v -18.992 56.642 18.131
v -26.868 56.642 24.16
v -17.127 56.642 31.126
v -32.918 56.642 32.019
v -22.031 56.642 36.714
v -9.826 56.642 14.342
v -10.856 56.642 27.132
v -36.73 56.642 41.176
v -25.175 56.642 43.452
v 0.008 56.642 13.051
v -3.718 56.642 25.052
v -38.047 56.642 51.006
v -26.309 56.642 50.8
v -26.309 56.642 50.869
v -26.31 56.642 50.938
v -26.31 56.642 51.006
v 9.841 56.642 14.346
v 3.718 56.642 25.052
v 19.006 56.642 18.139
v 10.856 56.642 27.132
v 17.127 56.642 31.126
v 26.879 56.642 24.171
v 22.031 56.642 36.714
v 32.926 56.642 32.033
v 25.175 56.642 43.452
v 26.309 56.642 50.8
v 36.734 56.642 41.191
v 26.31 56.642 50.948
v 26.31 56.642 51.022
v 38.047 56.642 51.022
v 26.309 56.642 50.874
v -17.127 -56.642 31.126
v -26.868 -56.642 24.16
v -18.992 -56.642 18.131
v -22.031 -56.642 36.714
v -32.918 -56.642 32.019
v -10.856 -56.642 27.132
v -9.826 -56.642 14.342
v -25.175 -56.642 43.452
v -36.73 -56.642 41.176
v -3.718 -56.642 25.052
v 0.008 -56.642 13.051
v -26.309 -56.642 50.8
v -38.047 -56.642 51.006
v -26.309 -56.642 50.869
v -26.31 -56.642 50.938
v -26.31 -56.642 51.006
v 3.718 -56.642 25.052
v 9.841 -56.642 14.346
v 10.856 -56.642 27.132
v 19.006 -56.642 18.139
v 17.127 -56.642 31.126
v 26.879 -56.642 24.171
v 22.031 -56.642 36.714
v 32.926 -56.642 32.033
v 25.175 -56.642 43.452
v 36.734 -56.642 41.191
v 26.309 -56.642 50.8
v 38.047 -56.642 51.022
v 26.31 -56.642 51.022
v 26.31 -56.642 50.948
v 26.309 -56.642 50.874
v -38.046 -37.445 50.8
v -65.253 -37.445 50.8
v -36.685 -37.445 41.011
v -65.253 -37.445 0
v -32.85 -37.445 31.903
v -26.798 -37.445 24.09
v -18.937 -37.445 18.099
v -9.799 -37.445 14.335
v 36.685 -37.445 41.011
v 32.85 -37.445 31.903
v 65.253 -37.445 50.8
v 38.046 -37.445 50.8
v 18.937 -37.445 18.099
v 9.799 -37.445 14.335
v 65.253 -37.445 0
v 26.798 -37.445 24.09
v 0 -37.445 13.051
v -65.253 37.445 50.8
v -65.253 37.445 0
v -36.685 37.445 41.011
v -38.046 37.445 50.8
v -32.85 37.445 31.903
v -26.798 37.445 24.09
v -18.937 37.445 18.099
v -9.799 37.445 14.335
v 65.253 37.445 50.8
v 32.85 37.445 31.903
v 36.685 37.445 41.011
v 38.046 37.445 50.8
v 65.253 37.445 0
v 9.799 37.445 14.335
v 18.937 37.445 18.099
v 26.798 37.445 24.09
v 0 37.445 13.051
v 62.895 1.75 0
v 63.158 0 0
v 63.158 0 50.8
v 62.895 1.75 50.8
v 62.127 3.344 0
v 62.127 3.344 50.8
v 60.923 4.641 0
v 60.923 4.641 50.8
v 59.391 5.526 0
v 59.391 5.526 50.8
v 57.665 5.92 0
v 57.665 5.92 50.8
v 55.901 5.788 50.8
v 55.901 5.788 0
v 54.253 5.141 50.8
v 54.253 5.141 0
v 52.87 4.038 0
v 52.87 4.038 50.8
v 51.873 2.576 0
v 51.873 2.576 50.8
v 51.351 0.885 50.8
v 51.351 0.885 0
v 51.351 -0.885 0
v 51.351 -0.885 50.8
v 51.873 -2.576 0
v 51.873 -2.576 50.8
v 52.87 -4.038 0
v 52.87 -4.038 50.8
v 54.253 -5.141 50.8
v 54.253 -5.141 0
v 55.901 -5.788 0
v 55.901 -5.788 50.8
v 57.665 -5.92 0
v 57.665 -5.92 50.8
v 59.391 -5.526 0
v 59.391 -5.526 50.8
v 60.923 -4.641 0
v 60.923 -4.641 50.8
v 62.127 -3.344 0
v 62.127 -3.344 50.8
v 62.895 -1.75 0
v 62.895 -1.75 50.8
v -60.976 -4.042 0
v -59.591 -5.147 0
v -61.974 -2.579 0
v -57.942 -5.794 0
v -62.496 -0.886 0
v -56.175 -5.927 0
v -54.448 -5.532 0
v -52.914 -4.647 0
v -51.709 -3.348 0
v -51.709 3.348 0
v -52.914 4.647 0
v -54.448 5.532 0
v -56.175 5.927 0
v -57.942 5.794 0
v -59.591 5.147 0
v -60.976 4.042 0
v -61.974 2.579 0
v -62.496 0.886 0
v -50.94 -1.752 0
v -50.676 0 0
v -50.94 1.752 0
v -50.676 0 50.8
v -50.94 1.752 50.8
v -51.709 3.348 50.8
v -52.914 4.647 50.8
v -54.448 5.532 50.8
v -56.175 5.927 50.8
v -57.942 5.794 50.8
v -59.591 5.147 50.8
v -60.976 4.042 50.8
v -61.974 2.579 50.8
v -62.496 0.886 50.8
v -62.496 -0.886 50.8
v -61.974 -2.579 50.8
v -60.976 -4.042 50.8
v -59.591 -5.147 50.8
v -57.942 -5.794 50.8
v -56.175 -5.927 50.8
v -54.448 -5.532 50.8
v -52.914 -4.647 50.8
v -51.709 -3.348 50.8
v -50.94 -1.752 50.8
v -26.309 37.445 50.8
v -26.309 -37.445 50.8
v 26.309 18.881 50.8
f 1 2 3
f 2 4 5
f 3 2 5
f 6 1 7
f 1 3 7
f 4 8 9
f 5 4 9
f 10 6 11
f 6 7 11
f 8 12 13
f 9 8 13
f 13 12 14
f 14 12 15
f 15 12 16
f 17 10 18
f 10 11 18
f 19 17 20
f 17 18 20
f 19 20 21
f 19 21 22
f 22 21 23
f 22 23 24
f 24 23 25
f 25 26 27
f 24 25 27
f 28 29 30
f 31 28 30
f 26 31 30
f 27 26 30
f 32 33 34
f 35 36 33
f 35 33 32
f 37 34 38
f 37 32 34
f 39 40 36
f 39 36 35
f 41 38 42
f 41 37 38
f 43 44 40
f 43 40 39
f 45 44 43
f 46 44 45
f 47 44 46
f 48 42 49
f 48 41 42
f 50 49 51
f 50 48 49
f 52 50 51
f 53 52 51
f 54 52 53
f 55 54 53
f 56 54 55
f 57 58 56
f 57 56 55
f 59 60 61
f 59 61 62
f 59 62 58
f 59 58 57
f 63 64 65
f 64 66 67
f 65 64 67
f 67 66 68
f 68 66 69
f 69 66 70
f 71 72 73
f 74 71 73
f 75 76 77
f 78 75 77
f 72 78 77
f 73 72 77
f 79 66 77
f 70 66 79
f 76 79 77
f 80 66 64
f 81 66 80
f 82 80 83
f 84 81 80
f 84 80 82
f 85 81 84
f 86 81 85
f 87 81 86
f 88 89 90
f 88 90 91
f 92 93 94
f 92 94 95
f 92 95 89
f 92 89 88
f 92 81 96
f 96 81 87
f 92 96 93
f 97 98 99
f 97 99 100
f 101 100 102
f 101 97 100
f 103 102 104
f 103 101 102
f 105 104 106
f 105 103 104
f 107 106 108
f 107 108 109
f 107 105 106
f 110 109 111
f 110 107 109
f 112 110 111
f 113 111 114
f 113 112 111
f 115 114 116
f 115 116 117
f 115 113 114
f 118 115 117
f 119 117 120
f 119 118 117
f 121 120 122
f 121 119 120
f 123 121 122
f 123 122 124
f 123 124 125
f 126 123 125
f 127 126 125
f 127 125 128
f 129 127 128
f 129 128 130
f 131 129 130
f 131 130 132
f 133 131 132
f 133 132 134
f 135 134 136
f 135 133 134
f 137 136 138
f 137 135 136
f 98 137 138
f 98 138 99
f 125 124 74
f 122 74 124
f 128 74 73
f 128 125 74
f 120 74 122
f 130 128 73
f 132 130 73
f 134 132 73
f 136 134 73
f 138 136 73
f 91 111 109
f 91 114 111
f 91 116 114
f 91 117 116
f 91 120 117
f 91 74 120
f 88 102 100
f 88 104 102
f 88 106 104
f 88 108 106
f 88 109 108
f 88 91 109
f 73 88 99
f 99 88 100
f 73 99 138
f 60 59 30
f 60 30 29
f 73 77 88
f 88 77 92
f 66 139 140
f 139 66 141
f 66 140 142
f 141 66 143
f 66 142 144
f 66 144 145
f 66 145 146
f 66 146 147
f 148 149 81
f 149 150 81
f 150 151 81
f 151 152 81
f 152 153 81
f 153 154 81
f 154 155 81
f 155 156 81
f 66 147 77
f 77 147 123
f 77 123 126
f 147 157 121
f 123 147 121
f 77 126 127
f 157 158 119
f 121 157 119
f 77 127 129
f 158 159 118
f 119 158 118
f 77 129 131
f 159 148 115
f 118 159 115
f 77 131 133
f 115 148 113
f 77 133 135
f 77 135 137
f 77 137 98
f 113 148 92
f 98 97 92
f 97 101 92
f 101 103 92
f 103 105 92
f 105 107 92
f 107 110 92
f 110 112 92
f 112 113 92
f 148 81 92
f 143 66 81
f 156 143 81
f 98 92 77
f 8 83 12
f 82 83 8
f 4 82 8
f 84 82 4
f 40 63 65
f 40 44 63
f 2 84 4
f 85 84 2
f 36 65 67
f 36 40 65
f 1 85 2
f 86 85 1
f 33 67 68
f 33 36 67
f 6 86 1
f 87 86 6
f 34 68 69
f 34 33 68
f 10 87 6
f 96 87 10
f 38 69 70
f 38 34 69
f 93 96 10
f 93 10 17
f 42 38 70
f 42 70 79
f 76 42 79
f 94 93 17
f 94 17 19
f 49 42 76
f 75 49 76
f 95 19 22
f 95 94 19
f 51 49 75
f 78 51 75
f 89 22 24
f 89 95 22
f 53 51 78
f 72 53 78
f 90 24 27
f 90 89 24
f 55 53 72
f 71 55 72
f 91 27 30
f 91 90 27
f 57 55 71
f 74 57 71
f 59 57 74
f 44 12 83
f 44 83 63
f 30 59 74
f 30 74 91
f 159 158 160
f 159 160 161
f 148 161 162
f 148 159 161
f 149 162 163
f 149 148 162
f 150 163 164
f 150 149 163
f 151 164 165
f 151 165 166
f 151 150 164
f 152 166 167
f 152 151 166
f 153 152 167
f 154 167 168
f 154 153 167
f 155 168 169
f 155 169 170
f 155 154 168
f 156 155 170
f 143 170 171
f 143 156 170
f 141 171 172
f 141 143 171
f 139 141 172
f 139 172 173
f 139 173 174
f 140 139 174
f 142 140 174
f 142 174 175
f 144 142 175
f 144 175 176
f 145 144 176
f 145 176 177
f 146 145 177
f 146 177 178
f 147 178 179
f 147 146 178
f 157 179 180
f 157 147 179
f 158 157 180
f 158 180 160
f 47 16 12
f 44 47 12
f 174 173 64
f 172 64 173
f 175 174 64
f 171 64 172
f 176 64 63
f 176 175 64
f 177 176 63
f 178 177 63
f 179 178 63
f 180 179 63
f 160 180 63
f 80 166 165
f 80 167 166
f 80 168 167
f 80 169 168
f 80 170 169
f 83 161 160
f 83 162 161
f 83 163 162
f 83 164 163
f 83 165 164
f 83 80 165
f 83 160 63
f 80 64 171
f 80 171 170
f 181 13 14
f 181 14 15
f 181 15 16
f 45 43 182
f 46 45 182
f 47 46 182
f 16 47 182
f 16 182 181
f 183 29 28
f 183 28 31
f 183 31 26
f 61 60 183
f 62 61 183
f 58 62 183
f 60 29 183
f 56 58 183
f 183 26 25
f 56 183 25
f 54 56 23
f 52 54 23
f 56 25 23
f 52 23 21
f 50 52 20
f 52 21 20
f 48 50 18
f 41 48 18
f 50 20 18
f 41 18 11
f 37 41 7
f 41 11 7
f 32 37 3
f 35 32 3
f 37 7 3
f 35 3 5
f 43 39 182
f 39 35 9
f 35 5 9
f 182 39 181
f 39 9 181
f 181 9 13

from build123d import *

# Parameters (mm, degrees)
F0_W     = 130.505652
F0_H     = 74.890166
F0_R     = 5.943332
F0_R_2   = 5.936545
F1_DEPTH = 50.8
F3_DEPTH = 56.642
F4_DEPTH = 111.252


with BuildPart() as f1:
    # F0 (on Top) → F1 (new body)
    with BuildSketch(Plane.XY):
        Rectangle(F0_W, F0_H)
        with Locations((-56.619376, 0)):
            Circle(F0_R, mode=Mode.SUBTRACT)
        with Locations((57.221707, 0)):
            Circle(F0_R_2, mode=Mode.SUBTRACT)
    extrude(amount=F1_DEPTH)

    # F2 (on Front) → F3 (join, symmetric)
    with BuildSketch(Plane.XZ):
        with BuildLine():
            Line((-26.310177, 51.006424), (-38.046643, 51.006424))
            ThreePointArc((-38.046643, 51.006424), (0.00796, 13.051229), (38.046678, 51.022345))
            Line((38.046678, 51.022345), (26.310227, 51.022345))
            ThreePointArc((26.310227, 51.022345), (0.00796, 24.787647), (-26.310177, 51.006424))
        make_face()
    extrude(amount=F3_DEPTH, both=True)

    # F3_face (on face) → F4 (cut, symmetric)
    with BuildSketch(Plane(origin=(0, 37.445083, 39.770332), x_dir=(-1, 0, 0), z_dir=(0, 1, 0))):
        with BuildLine():
            ThreePointArc((-26.308649, 11.029668), (0, -14.982687), (26.308649, 11.029668))
            Line((26.308649, 11.029668), (-26.308649, 11.029668))
        make_face()
    extrude(amount=F4_DEPTH, both=True, mode=Mode.SUBTRACT)


solid = f1.part
